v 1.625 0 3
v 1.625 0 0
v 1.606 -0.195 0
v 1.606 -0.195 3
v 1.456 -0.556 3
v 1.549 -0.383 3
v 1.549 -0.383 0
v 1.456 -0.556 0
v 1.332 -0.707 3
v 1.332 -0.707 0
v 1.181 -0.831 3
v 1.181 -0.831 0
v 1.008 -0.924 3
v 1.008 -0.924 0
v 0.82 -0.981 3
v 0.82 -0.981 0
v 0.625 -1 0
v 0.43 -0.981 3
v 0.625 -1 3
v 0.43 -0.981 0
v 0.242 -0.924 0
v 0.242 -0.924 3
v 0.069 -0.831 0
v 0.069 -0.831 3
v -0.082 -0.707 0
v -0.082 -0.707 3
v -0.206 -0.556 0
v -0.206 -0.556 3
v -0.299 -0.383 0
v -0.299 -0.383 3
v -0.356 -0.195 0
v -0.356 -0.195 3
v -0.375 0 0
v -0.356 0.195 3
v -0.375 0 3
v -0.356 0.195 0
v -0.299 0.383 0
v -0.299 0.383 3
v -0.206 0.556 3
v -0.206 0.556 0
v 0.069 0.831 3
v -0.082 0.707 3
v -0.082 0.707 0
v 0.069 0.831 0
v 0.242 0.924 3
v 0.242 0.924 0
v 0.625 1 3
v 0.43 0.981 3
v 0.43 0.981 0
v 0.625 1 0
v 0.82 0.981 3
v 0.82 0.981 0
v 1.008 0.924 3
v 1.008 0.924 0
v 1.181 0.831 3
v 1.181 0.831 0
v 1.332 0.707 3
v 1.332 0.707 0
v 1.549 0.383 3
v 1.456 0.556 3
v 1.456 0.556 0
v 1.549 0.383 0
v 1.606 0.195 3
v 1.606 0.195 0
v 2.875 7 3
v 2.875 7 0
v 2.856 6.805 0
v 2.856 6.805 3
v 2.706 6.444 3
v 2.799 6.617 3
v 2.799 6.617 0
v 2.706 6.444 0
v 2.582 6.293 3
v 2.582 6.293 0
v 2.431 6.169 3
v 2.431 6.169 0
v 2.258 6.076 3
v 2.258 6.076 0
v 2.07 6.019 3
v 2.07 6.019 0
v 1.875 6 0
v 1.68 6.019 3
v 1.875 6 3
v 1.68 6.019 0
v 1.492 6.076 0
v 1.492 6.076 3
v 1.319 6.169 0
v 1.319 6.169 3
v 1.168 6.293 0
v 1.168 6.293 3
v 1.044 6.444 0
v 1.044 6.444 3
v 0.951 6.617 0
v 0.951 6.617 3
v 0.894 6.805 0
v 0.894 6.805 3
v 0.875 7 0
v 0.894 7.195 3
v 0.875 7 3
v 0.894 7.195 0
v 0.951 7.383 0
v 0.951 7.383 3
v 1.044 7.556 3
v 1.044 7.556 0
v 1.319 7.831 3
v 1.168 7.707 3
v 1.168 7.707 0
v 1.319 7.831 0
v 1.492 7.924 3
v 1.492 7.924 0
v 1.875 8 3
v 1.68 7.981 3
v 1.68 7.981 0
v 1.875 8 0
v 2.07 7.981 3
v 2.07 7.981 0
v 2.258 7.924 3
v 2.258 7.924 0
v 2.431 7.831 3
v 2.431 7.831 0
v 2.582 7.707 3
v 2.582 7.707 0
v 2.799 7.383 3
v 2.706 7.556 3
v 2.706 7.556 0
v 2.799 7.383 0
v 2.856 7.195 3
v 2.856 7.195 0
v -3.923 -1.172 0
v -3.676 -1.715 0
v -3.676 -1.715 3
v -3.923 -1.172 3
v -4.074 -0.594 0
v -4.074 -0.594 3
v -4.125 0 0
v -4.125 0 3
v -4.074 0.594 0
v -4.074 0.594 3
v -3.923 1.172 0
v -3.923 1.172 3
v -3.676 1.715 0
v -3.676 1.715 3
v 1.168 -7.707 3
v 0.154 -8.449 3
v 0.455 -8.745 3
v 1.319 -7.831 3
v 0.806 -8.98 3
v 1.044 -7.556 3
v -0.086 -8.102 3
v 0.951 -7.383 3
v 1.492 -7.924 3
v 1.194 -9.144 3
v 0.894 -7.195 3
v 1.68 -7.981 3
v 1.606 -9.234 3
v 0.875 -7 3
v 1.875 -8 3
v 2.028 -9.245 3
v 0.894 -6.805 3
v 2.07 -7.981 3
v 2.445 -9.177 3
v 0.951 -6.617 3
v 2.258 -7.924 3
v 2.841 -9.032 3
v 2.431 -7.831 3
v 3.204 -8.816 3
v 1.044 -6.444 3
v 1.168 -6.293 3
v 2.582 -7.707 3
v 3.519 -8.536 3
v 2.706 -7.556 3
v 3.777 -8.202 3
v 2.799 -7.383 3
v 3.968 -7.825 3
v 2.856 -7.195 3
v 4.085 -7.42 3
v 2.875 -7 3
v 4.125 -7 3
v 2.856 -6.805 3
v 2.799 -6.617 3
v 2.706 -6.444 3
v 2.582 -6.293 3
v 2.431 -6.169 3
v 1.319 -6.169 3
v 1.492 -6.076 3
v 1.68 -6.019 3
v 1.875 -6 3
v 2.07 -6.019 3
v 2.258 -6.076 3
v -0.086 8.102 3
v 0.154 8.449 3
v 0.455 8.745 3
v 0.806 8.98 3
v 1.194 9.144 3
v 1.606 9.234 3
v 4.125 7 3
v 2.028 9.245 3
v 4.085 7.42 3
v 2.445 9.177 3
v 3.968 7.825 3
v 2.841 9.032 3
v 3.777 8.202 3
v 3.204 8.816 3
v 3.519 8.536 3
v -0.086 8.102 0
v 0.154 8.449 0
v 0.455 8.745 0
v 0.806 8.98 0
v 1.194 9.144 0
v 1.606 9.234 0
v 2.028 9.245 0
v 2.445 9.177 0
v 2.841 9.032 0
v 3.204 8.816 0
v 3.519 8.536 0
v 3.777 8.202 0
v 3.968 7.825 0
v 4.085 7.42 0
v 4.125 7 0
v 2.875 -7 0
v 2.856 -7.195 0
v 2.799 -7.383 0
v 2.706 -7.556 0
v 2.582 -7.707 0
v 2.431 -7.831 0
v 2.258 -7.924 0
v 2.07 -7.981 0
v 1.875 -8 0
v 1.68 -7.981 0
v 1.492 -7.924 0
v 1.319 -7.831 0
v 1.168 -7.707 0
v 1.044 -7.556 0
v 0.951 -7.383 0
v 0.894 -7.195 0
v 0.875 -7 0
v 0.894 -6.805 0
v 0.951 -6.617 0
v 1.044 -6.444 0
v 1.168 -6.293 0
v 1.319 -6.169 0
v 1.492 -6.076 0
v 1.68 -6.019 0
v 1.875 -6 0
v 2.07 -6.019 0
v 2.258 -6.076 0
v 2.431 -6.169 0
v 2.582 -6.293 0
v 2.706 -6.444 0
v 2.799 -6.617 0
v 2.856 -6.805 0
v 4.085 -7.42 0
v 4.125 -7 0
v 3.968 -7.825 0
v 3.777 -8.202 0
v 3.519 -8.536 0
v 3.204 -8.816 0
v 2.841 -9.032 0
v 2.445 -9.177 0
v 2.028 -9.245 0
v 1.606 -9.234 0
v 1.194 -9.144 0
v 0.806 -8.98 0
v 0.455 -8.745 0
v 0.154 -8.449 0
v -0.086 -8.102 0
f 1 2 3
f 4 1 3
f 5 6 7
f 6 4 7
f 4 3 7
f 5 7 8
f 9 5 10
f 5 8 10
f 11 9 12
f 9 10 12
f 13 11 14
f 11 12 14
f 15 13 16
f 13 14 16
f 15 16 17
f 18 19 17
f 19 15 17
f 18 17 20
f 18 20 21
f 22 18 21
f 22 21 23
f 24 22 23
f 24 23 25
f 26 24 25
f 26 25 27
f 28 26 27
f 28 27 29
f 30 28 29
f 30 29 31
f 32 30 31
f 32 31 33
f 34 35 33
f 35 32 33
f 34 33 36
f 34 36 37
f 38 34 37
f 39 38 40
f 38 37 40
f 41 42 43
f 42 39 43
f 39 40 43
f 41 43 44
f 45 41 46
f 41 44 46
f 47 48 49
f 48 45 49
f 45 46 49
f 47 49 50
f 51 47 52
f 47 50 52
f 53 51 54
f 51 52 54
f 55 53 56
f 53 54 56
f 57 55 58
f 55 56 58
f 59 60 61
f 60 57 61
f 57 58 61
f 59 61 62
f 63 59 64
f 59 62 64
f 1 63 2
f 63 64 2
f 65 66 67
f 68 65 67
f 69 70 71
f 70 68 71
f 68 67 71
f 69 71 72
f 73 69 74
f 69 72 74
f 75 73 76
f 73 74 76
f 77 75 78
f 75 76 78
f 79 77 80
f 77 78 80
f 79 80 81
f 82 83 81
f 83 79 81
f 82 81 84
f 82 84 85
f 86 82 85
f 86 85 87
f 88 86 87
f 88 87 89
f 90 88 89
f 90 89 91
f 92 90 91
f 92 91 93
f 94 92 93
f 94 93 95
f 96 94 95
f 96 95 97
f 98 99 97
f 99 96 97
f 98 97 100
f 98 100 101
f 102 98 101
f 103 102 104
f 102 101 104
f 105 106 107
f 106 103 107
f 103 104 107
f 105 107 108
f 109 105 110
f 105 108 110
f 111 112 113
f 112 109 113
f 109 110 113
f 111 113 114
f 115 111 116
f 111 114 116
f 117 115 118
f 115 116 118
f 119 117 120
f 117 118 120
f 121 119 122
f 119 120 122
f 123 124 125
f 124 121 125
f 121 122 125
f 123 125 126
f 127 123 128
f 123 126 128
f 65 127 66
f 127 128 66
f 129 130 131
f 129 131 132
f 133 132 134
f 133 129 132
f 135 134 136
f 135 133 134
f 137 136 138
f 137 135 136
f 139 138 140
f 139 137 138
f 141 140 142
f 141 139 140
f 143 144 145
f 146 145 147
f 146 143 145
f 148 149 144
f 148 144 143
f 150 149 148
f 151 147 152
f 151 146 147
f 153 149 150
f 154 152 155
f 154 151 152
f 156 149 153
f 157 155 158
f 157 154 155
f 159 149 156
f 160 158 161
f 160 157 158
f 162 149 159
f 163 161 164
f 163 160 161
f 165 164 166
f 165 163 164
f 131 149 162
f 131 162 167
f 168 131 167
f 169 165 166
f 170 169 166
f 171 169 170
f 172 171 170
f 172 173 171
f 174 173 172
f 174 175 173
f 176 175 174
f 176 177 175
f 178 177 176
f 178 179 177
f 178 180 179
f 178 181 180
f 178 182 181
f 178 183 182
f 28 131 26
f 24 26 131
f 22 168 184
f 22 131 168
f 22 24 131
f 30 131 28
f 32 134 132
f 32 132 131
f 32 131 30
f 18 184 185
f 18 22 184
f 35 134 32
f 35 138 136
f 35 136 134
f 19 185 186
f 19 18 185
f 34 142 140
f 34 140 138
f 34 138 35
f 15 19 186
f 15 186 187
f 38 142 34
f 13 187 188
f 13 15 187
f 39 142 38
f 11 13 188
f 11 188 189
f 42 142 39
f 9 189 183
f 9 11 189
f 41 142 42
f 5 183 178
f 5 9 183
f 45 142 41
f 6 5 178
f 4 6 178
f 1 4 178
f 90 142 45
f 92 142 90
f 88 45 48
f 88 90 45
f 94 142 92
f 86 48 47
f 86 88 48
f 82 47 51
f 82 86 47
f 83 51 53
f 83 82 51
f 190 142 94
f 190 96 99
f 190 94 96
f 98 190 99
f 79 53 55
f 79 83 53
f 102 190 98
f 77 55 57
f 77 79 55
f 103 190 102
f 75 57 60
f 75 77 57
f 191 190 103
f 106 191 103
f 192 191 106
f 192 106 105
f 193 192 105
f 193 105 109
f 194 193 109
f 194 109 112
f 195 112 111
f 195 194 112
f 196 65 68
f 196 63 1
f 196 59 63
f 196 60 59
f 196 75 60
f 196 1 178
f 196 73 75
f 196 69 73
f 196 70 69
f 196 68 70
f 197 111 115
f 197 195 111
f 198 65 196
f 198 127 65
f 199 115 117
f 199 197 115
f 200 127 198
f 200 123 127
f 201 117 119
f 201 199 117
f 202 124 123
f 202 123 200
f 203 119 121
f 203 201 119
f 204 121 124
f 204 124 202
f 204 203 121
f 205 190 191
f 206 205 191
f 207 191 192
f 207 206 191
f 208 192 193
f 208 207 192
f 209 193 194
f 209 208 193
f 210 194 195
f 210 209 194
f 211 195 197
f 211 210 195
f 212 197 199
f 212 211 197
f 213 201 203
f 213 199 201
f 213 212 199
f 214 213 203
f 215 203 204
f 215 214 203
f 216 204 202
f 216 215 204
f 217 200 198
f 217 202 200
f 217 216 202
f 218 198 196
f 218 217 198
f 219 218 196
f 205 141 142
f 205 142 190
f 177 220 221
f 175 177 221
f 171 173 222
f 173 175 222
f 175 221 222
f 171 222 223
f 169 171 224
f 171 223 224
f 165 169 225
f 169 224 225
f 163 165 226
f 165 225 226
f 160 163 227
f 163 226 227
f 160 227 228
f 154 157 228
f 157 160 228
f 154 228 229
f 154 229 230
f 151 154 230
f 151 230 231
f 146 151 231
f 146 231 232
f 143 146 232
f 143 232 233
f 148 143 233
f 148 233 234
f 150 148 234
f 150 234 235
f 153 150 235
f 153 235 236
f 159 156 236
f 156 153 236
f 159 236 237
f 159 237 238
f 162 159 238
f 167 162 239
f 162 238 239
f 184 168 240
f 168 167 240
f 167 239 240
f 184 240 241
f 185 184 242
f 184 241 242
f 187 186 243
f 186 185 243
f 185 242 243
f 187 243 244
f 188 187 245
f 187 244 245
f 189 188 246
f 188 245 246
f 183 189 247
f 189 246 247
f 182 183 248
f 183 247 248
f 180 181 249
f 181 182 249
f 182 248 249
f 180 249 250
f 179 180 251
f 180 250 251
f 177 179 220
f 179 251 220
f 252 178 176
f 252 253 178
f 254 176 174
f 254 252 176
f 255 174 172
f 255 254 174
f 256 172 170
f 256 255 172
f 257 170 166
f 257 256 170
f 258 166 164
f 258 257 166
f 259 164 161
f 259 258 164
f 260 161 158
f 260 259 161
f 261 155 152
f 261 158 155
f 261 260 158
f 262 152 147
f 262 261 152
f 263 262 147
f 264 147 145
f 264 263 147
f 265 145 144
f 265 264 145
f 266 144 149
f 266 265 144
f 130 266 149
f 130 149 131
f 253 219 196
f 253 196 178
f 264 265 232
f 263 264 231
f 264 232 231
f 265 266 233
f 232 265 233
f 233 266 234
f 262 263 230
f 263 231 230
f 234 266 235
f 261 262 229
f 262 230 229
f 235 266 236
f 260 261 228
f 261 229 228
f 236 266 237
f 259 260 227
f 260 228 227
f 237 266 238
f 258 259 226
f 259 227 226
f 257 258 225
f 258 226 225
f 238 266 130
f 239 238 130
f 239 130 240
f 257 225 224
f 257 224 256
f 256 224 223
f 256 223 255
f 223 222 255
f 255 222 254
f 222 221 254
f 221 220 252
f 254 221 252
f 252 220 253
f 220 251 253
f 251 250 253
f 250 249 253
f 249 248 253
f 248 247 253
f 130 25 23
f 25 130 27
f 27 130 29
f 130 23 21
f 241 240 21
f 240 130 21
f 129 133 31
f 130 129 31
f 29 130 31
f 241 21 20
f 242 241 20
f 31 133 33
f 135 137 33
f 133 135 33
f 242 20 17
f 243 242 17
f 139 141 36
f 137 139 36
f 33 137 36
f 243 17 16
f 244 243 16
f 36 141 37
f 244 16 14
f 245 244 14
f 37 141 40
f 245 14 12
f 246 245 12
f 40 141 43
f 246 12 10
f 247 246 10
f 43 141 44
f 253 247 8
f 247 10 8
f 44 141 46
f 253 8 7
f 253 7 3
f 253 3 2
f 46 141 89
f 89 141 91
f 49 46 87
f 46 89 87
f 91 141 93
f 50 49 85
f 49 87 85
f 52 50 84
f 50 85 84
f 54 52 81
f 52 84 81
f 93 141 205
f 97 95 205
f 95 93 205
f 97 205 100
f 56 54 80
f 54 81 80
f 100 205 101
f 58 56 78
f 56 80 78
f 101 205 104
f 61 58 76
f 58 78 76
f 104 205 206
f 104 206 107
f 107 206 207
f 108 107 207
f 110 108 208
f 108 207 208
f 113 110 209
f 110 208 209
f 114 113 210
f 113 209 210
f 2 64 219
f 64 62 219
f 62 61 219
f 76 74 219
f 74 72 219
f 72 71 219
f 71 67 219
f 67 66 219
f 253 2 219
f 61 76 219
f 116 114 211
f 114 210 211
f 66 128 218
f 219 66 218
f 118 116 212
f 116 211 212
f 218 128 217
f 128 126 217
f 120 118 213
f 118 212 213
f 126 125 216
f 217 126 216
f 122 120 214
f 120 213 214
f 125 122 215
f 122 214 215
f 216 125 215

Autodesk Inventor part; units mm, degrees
ref_plane "YZ Plane" through (0, 0, 0) normal (1, 0, 0) x (0, 1, 0)
ref_plane "XZ Plane" through (0, 0, 0) normal (0, 1, 0) x (-1, 0, 0)
ref_plane "XY Plane" through (0, 0, 0) normal (0, 0, 1) x (1, 0, 0)
sketch "Sketch1" plane through (0, 0, 0) normal (0, 0, 1) x (1, 0, 0)
  line L0 (0.625, 2.5) -> (2.625, 2.5) projected
  line L1 (4.125, 1) -> (2.625, 2.5) projected
  line L2 (4.125, 7) -> (4.125, 1) projected
  arc A0 (4.125, 7) -> (-0.0865, 8.1023) centre (1.875, 7) ccw projected
  line L3 (-3.6762, 1.7147) -> (-0.0865, 8.1023) projected
  arc A1 (-3.6762, 1.7147) -> (-3.6762, -1.7147) centre (-0.625, 0) ccw projected
  line L4 (-0.0865, -8.1023) -> (-3.6762, -1.7147) projected
  arc A2 (-0.0865, -8.1023) -> (4.125, -7) centre (1.875, -7) ccw projected
  line L5 (4.125, -1) -> (4.125, -7) projected
  line L6 (2.625, -2.5) -> (4.125, -1) projected
  line L7 (2.625, -2.5) -> (0.625, -2.5) projected
  arc A3 (0.625, 2.5) -> (0.625, -2.5) centre (0.625, 0) ccw projected
  circle A4 centre (1.875, 7) radius 1 projected
  circle A5 centre (1.875, -7) radius 1 projected
  circle A6 centre (0.625, 0) radius 1 projected
  line L8 (4.125, -1) -> (2.625, -2.5) projected
  line L9 (4.125, 1) -> (4.125, -1) projected
  line L10 (2.625, 2.5) -> (4.125, 1) projected
  line L11 (2.625, 2.5) -> (0.625, 2.5) projected
  arc A7 (0.625, 2.5) -> (0.625, -2.5) centre (0.625, 0) ccw projected
  line L12 (0.625, -2.5) -> (2.625, -2.5) projected
  point P0 (0, 0)
extrude "Extrusion1" add sketch "Sketch1" along normal blind 3
properties part number "belt_tender_2"
